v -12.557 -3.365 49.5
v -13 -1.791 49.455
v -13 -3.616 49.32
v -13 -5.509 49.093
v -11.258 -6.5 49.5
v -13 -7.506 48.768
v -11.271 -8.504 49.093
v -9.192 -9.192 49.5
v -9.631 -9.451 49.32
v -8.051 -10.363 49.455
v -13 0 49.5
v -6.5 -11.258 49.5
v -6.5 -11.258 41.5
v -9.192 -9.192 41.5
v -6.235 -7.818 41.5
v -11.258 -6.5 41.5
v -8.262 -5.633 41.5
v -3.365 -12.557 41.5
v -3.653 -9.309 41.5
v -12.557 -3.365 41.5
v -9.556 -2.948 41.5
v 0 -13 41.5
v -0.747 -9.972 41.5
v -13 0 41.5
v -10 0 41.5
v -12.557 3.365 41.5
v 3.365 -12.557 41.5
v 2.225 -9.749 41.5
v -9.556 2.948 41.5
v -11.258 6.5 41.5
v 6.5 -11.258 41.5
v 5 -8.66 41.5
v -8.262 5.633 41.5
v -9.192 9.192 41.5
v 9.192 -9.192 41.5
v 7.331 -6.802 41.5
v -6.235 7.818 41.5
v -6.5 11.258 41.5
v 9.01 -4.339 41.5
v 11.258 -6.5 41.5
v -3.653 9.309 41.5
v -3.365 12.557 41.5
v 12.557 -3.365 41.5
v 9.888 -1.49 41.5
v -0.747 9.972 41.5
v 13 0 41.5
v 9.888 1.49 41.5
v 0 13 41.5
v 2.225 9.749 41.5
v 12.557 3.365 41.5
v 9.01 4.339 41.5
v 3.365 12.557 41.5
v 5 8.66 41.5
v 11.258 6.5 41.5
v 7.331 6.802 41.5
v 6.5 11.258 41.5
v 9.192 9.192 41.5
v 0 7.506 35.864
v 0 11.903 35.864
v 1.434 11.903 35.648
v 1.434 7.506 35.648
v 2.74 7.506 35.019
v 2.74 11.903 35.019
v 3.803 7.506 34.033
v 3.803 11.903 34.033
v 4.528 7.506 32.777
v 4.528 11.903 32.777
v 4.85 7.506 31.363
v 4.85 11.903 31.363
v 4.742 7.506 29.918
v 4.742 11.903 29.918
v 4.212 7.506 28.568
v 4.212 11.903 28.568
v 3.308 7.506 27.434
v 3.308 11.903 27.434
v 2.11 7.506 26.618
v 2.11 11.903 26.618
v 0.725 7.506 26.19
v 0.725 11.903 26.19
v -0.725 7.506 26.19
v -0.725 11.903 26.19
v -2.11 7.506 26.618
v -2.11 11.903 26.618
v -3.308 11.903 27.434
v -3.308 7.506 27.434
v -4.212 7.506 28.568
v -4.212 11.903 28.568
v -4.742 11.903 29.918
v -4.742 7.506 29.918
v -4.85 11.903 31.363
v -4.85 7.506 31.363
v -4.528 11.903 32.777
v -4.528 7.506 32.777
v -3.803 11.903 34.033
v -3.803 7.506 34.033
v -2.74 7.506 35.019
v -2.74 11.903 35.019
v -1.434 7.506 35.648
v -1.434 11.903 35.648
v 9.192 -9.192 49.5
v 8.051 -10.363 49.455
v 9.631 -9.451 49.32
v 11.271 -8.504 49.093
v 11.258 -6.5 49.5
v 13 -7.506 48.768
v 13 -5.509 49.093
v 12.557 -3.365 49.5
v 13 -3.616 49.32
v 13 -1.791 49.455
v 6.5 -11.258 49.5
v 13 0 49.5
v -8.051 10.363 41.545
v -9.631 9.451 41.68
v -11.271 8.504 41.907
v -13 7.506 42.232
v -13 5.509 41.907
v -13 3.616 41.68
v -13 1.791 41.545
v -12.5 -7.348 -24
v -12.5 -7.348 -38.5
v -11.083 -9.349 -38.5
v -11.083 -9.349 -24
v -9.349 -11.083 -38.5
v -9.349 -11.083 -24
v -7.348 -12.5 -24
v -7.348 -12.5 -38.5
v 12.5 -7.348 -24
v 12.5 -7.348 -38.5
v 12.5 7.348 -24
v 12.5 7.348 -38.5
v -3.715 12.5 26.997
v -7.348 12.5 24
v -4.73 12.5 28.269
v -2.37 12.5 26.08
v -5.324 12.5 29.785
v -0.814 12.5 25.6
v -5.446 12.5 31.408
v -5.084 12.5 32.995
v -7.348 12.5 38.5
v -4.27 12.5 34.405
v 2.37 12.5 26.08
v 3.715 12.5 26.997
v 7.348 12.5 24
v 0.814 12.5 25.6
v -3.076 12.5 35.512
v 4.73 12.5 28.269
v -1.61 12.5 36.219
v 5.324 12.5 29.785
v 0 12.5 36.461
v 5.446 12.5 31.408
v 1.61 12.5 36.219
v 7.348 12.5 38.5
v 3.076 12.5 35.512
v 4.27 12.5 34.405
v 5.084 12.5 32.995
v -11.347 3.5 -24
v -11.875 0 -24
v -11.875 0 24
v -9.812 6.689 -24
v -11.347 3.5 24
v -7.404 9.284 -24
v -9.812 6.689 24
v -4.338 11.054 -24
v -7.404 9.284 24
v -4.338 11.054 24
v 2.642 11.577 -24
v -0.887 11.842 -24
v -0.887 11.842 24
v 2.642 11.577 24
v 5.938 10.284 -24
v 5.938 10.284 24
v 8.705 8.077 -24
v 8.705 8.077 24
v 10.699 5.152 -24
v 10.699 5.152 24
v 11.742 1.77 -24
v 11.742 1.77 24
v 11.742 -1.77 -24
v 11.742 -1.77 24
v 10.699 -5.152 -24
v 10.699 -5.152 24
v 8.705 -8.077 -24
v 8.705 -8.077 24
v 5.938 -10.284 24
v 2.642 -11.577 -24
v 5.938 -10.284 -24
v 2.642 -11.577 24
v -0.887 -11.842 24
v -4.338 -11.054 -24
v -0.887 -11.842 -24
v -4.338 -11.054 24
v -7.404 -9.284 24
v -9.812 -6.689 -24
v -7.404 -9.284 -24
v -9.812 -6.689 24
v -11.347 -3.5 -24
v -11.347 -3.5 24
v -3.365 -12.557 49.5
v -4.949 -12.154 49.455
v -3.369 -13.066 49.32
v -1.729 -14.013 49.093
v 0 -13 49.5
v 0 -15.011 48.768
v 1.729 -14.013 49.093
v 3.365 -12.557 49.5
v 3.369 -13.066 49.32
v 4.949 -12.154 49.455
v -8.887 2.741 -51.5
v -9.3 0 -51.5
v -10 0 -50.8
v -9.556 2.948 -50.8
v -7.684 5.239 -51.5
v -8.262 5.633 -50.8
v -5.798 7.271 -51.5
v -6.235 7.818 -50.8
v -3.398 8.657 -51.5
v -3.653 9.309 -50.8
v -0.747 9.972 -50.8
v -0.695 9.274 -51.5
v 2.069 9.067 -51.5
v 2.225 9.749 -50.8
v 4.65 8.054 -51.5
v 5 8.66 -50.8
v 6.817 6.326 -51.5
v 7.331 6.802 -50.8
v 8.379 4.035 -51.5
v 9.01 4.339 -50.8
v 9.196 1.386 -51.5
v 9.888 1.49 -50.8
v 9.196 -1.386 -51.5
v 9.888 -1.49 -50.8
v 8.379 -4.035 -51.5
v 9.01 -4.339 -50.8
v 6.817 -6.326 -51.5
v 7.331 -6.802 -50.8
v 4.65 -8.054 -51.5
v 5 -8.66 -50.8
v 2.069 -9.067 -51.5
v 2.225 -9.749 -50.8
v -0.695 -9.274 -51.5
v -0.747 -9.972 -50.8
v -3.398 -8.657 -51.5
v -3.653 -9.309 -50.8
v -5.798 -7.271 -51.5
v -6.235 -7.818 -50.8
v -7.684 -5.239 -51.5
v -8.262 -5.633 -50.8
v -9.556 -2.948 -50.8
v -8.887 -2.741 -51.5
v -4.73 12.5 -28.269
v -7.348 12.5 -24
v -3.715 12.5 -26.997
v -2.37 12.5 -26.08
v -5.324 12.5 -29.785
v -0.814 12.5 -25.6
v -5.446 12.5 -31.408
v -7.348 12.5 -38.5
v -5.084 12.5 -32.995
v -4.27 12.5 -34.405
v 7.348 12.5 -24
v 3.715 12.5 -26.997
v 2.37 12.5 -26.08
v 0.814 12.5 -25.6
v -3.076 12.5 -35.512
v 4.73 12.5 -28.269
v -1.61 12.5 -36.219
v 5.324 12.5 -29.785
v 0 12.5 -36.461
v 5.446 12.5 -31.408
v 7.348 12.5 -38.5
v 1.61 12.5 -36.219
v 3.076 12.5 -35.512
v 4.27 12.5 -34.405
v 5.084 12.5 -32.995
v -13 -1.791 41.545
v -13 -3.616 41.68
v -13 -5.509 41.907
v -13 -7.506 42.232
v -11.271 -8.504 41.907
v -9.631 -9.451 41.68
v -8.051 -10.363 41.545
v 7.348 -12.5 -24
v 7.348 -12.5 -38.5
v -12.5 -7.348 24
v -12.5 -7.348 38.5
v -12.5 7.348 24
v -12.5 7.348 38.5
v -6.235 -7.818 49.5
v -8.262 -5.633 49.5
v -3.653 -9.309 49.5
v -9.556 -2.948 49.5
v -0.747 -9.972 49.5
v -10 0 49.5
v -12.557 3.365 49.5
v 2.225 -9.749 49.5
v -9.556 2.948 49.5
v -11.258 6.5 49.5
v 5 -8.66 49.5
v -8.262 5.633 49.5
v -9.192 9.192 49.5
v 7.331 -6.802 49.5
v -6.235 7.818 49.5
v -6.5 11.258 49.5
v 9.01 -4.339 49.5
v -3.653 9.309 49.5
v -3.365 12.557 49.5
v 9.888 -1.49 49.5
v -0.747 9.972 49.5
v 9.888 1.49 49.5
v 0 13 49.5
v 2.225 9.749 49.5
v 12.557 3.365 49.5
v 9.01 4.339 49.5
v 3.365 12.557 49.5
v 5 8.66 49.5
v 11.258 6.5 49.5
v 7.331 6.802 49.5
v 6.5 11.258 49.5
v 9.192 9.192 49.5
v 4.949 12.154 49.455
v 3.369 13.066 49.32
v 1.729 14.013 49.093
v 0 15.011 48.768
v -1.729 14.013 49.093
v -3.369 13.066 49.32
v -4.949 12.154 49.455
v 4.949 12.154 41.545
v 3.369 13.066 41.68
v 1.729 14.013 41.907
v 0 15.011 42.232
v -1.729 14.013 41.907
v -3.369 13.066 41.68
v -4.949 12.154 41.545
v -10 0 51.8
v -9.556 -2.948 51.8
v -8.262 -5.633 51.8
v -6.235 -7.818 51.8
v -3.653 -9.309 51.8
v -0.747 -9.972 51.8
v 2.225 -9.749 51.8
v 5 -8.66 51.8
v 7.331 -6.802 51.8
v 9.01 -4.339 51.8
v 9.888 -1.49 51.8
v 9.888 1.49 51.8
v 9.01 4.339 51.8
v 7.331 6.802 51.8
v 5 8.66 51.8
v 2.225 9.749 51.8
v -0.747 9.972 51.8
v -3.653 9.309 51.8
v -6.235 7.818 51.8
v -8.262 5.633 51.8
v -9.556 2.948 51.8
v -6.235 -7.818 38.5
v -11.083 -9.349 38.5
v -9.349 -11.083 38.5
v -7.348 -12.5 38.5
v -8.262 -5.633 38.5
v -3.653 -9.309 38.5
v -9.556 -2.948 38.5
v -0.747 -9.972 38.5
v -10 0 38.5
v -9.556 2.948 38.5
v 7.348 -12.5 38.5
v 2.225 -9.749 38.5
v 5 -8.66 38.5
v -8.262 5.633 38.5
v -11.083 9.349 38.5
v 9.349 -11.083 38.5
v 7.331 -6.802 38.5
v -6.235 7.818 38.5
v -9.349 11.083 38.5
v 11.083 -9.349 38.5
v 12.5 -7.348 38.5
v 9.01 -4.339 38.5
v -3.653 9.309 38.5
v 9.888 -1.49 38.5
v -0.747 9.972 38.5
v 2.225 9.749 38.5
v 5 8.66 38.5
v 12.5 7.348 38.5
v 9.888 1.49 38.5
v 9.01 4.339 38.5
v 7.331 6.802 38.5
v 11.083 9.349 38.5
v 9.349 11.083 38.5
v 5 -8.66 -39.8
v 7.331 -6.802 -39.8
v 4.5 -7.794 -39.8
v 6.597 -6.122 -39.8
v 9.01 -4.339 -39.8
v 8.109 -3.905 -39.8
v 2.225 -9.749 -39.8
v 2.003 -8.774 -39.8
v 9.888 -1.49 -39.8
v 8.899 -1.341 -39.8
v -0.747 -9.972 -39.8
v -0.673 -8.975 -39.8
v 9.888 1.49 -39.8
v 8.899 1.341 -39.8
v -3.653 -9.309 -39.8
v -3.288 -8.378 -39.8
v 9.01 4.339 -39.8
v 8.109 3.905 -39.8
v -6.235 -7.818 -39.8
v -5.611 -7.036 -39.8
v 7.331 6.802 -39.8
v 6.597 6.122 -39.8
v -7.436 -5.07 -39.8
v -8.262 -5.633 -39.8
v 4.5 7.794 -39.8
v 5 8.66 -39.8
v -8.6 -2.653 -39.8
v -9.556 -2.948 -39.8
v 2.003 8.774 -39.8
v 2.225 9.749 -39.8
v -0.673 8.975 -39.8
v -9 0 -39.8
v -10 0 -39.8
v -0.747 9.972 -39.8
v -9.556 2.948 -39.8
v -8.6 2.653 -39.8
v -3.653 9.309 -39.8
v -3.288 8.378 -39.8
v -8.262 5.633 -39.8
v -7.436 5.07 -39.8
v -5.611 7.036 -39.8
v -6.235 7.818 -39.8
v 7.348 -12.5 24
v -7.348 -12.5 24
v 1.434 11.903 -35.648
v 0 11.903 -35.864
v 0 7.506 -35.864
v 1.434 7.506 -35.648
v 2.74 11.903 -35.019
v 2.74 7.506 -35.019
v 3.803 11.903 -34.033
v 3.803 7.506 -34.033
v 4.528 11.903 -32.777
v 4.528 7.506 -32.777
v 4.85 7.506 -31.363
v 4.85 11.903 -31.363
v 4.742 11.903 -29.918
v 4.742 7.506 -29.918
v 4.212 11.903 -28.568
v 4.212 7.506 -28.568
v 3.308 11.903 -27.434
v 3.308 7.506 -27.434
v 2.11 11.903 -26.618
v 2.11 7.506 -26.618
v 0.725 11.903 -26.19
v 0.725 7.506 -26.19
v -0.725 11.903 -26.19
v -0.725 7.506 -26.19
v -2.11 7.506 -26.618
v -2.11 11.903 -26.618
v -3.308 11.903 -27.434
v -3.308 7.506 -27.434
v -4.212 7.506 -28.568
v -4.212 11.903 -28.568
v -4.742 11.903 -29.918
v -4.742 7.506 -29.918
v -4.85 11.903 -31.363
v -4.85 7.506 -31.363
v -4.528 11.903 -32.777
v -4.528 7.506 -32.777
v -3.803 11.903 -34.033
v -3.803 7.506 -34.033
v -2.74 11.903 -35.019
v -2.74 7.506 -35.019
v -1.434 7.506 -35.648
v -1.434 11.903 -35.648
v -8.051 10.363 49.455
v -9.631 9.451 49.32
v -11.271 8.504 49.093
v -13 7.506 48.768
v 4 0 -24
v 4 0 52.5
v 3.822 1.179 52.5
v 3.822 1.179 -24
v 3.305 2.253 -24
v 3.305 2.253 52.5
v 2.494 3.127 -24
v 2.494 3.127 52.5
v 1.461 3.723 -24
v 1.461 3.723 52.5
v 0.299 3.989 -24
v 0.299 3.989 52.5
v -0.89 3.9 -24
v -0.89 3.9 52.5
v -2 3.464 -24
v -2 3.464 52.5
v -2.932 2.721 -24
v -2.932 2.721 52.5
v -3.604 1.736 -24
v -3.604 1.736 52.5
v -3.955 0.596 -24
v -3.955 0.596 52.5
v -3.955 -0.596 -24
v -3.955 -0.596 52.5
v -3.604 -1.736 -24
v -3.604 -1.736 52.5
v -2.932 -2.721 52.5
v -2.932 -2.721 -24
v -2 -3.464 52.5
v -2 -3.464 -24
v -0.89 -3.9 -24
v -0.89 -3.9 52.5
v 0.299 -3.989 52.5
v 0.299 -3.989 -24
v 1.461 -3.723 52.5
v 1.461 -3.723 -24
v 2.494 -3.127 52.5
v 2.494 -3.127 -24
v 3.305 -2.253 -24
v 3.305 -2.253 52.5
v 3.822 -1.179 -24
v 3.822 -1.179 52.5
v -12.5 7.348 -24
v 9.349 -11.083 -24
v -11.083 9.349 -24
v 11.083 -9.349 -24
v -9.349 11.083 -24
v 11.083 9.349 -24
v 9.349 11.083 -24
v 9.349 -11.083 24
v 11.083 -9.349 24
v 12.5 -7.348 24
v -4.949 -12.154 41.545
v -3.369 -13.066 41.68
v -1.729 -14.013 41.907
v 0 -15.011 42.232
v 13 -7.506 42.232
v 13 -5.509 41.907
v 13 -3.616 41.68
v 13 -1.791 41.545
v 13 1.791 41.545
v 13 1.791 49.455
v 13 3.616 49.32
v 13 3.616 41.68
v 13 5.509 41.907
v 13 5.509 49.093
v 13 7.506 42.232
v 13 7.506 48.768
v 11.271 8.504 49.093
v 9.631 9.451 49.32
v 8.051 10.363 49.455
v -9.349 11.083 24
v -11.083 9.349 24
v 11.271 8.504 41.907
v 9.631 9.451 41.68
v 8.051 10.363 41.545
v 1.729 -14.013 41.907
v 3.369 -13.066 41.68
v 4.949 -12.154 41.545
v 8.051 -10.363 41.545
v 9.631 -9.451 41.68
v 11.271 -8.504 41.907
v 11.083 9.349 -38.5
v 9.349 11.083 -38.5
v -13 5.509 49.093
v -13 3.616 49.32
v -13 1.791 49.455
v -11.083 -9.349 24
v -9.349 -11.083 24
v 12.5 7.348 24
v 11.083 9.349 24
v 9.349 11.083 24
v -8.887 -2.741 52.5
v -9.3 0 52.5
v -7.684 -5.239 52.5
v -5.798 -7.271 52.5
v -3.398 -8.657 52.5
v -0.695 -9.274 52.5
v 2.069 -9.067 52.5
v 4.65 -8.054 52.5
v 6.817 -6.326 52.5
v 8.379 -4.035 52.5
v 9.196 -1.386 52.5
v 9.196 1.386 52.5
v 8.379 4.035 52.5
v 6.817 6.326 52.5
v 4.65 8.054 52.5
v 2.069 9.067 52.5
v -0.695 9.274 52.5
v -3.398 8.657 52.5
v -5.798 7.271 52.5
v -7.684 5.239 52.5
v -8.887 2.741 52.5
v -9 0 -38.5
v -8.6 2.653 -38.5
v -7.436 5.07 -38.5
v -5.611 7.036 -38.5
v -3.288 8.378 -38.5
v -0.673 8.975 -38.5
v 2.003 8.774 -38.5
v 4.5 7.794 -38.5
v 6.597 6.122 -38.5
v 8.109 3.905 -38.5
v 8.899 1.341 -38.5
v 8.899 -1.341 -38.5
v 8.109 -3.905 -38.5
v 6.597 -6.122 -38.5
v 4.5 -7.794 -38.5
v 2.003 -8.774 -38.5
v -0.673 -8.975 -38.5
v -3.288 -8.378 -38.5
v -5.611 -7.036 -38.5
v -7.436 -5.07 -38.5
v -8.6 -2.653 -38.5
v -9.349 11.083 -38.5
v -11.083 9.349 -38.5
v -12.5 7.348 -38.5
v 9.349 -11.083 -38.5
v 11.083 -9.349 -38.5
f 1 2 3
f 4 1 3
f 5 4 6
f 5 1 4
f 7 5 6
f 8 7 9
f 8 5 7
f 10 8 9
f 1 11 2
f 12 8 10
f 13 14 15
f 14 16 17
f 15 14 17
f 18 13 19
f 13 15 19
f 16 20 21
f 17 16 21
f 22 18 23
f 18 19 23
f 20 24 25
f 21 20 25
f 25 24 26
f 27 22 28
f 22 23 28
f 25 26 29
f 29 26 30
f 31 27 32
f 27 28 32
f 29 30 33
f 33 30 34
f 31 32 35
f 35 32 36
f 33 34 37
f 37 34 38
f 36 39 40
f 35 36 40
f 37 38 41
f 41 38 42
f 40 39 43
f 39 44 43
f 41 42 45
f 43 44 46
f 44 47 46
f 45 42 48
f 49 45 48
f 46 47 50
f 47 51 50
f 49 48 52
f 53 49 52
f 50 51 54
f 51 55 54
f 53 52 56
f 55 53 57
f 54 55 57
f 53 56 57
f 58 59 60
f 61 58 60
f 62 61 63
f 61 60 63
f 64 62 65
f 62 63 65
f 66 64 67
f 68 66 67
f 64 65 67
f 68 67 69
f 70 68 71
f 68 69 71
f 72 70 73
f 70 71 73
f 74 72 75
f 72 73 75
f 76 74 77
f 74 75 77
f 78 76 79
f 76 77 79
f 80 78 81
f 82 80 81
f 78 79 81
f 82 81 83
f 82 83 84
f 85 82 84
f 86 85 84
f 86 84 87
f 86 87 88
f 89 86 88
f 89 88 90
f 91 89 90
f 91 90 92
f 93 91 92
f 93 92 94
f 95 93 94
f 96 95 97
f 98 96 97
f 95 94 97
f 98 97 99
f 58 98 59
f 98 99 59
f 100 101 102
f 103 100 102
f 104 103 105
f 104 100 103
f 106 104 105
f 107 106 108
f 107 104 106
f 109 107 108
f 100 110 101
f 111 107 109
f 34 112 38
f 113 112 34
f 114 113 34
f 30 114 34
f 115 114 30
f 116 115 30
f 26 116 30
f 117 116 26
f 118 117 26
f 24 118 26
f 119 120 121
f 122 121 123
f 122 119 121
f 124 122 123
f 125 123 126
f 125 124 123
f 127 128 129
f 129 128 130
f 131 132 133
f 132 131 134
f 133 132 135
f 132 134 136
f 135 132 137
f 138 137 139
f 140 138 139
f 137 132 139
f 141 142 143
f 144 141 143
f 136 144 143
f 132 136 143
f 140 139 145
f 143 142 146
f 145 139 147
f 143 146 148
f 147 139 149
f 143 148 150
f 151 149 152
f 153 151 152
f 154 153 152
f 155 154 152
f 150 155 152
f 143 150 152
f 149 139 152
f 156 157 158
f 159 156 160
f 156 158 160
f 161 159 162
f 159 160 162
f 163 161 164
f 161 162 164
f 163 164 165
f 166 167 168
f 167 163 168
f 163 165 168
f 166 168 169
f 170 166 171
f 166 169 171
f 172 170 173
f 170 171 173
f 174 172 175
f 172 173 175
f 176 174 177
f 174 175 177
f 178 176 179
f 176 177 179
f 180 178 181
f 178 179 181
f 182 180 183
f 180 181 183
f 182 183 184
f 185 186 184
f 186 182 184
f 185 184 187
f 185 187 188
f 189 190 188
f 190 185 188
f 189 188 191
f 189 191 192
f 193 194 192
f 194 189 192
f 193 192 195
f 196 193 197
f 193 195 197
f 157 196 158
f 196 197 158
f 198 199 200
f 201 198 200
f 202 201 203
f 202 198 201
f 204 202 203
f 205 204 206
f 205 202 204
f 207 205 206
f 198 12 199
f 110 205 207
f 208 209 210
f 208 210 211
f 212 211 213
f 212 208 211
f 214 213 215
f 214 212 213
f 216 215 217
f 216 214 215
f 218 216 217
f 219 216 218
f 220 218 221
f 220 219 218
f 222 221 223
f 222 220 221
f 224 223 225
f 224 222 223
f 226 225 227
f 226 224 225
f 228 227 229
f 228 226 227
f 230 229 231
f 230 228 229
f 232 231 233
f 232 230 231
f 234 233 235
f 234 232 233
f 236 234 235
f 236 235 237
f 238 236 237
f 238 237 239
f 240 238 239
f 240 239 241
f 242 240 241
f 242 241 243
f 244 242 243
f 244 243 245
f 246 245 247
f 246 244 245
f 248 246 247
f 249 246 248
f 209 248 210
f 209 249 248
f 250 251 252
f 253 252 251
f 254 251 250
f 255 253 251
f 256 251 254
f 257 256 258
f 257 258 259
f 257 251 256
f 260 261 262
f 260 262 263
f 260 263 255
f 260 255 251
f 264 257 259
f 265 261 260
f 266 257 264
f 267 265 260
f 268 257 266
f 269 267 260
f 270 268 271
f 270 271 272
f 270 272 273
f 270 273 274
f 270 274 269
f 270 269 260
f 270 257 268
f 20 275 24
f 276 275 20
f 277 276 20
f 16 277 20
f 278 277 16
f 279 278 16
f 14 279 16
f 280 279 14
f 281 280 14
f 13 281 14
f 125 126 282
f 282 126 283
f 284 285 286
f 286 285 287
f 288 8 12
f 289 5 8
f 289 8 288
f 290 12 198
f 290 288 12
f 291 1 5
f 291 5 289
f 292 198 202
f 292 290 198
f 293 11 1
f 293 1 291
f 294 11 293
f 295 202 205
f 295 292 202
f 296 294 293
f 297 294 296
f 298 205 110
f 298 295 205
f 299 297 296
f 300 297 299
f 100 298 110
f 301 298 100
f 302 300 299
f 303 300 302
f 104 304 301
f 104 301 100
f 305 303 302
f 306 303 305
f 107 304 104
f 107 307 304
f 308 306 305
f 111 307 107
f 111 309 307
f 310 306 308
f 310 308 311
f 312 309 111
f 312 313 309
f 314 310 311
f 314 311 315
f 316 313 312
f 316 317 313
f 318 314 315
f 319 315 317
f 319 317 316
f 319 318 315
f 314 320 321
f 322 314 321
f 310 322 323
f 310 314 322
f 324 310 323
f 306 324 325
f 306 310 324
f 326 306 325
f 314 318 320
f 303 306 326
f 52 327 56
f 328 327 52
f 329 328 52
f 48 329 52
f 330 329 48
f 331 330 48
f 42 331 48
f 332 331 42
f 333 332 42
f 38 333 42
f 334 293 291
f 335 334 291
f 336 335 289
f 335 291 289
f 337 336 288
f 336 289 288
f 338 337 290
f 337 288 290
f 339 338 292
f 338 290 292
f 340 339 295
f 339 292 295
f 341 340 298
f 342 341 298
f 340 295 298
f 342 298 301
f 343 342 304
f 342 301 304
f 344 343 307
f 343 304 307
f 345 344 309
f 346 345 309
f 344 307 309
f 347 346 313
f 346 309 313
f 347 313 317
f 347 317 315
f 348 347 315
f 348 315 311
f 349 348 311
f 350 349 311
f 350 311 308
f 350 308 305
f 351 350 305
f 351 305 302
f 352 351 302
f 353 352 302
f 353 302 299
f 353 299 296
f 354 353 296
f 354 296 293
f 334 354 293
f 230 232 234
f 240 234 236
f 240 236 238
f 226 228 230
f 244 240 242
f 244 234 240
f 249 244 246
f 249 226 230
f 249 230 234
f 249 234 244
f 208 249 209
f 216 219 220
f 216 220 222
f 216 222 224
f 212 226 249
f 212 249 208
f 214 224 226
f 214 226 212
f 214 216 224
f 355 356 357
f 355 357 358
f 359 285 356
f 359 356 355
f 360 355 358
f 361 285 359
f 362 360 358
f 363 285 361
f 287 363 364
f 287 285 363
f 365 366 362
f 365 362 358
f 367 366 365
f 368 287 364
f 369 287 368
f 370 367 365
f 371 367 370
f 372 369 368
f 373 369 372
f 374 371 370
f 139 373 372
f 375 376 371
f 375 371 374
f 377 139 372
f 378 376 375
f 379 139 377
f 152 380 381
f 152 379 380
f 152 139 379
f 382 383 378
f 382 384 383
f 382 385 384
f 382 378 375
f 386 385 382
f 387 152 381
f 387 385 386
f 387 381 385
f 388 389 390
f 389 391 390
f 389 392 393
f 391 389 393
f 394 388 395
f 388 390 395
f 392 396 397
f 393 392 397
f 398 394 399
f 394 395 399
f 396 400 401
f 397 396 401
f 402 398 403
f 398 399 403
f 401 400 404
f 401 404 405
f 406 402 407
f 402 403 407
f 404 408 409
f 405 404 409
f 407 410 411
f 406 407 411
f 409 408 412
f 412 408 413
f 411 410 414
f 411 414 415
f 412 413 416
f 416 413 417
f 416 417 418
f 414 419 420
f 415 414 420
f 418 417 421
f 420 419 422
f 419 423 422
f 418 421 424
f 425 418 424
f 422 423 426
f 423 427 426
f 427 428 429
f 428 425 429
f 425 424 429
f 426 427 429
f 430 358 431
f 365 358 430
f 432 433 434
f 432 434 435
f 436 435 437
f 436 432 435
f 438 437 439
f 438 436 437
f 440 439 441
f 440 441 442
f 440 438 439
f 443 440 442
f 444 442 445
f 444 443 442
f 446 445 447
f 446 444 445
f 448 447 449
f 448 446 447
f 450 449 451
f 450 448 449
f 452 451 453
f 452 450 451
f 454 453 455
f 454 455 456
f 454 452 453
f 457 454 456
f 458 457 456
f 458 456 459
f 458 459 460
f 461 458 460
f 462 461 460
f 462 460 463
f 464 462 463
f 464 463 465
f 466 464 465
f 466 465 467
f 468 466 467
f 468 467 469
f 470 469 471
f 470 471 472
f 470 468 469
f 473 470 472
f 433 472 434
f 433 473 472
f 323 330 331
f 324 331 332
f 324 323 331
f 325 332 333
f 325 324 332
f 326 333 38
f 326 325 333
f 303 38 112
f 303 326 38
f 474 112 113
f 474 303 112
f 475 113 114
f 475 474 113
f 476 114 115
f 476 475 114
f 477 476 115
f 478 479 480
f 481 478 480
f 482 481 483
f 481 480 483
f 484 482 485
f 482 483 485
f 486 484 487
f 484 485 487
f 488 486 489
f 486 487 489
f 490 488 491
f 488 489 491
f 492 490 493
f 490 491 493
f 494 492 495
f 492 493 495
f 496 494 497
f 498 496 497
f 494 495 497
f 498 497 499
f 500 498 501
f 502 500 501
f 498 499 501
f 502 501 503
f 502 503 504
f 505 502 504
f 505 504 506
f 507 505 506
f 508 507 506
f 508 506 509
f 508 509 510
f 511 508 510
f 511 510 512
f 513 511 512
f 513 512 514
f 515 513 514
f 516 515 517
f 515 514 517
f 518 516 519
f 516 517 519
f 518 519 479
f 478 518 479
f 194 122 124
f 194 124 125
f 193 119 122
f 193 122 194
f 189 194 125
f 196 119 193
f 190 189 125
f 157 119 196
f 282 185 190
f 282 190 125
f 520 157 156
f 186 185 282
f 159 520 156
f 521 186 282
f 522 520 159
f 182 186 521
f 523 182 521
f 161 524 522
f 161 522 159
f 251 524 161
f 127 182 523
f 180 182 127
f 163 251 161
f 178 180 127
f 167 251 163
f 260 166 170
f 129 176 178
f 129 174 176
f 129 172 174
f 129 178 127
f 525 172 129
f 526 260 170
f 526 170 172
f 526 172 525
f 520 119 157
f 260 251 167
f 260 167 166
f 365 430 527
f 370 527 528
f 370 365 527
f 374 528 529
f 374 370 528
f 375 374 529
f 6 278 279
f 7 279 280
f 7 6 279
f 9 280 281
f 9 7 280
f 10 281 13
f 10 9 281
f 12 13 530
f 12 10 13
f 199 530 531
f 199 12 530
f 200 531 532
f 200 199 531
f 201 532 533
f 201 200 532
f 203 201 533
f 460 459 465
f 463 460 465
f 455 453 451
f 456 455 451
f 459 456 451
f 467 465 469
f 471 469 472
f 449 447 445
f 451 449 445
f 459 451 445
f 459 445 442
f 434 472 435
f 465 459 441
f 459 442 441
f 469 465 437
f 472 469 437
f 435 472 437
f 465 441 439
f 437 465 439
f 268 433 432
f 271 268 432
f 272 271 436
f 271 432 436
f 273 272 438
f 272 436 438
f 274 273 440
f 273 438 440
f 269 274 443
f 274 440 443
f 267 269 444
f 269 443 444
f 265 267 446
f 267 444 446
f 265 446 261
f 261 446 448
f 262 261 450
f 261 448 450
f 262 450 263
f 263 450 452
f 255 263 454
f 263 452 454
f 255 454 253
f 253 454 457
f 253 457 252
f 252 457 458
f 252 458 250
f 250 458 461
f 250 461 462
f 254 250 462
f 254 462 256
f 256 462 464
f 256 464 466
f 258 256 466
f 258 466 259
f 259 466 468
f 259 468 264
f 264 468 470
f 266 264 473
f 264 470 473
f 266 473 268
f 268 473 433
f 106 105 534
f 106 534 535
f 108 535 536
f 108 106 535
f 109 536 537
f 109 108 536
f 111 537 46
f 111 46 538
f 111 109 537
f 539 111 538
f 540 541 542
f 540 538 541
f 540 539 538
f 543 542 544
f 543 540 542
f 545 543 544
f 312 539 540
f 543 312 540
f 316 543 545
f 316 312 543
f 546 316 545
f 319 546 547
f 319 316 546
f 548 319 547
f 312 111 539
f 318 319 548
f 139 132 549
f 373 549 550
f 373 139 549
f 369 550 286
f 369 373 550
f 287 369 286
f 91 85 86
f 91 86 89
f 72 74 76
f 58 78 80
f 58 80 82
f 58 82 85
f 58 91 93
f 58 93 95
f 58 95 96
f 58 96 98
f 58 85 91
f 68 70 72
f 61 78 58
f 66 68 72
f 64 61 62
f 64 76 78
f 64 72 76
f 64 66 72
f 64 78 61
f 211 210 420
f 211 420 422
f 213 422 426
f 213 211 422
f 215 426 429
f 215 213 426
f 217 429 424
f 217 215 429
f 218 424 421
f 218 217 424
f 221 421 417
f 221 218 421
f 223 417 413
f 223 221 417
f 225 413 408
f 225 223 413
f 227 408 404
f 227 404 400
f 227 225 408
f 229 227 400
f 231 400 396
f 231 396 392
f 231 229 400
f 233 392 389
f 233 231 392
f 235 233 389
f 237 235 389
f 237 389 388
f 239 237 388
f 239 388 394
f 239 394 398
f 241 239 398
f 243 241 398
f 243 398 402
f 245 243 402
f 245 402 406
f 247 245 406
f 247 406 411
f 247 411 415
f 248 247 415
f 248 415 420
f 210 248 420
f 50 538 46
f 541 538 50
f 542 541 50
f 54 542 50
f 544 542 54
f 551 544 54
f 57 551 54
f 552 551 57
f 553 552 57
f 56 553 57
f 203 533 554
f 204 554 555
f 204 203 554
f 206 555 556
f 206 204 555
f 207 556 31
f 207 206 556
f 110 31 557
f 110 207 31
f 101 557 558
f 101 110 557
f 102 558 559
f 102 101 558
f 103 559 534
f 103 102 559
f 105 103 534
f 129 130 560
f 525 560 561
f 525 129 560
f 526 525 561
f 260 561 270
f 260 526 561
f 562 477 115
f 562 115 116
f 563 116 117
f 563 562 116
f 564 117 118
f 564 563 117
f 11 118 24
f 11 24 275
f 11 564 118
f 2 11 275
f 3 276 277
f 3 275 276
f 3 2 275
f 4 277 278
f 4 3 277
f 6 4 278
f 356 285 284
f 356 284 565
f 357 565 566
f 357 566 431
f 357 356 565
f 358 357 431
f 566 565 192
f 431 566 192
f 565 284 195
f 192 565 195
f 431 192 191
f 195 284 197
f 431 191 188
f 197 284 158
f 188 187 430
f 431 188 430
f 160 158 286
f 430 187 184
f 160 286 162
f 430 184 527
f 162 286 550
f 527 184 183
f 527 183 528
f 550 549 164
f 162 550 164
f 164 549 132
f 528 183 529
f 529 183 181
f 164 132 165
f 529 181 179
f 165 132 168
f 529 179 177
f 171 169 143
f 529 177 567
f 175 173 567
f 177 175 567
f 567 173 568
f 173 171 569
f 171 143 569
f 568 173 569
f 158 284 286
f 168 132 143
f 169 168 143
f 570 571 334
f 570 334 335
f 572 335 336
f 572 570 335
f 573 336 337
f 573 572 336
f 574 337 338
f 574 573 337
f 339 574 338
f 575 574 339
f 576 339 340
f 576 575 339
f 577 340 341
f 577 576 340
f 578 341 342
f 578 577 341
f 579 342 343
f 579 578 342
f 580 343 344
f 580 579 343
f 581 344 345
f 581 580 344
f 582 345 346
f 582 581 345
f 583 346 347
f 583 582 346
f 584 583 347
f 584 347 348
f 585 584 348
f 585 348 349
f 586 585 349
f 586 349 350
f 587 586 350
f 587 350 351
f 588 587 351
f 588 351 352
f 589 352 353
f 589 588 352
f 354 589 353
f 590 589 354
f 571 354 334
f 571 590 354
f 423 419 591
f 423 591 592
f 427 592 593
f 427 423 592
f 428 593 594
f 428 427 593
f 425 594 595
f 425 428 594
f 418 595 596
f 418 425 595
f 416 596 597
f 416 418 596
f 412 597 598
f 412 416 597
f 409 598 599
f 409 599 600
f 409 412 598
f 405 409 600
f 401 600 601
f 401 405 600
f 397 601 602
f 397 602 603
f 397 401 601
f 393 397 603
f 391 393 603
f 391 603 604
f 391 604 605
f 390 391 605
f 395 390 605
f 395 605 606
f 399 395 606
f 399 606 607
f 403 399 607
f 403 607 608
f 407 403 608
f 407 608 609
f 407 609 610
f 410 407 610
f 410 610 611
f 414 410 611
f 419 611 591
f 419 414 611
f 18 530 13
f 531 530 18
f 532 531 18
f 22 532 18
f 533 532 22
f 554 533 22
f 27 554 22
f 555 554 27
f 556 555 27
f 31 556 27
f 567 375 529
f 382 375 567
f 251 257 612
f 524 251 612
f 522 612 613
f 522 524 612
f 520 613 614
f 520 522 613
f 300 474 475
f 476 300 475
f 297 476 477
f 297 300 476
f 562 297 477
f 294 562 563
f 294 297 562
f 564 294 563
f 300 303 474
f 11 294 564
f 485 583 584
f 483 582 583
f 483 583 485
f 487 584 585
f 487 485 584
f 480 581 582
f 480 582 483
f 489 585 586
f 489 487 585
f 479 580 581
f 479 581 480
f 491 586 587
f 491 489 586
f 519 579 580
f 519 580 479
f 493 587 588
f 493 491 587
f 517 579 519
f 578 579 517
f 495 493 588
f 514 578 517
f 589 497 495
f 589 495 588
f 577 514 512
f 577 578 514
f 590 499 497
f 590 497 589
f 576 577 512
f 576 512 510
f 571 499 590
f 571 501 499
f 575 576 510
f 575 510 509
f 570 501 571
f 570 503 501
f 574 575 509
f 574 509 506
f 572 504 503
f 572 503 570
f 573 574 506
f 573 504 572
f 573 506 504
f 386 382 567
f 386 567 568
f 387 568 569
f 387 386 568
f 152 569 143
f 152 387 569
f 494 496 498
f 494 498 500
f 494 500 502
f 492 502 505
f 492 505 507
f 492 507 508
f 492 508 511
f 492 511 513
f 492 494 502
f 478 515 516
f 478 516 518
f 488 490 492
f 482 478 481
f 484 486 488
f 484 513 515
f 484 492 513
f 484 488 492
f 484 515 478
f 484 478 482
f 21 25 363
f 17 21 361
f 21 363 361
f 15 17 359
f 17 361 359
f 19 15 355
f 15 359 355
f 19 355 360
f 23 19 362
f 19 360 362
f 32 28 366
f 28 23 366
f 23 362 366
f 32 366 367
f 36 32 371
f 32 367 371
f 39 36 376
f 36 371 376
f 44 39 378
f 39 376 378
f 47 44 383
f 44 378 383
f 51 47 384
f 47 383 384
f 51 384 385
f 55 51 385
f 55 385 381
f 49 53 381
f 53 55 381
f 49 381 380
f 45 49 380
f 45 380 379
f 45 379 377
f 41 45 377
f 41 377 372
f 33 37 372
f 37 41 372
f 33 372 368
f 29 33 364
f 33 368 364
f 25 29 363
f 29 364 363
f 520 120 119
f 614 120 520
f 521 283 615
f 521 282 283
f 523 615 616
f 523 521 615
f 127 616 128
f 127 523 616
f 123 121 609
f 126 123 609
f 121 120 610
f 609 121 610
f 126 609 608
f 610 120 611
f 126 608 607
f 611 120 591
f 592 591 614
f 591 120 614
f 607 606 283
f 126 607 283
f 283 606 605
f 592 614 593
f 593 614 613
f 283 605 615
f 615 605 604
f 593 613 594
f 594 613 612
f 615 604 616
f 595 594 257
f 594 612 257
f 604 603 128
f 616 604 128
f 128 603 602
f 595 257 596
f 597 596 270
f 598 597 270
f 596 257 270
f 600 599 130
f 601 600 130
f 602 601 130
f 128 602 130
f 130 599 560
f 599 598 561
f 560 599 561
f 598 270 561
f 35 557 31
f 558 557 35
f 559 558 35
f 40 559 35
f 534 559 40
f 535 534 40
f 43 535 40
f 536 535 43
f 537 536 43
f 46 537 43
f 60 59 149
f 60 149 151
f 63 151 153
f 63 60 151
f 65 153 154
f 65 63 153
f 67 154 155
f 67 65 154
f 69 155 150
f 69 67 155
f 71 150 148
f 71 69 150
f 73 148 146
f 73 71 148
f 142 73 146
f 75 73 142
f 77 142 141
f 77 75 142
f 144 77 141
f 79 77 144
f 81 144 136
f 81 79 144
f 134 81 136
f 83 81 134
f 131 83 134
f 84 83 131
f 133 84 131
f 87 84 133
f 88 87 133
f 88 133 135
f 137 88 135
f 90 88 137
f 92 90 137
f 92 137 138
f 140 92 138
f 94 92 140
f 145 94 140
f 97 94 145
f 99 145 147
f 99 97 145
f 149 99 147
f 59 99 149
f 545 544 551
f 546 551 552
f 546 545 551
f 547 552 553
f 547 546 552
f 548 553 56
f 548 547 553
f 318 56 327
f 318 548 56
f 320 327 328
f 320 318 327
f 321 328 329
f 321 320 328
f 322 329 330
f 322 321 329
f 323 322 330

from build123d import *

# Parameters (mm, degrees)
EXTRUDE_START       = 38.5
SKETCH_4_W          = 25
SKETCH_4_H          = 25
EXTRUDE_1_DEPTH     = 14.5
SKETCH_5_R          = 11.875
EXTRUDE_2_DEPTH     = 62.5
SKETCH_6_R          = 10
EXTRUDE_3_DEPTH     = 14
EXTRUDE_START_2     = 49.5
EXTRUDE_4_DEPTH     = 8
SKETCH_8_R          = 4.864
CUT_EXTRUDE_1_DEPTH = 4.994447
SKETCH_9_OUTSIDE_W  = 47.858
SKETCH_9_OUTSIDE_H  = 51.88
SKETCH_9_OUTSIDE_R  = 14.5
CUT_EXTRUDE_2_DEPTH = 77
SKETCH_11_R         = 4
CUT_EXTRUDE_3_DEPTH = 76.5
CHAMFER_1_SIZE      = 0.7
CHAMFER_2_SIZE      = 0.59728
EXTRUDE_START_3     = 13
SKETCH_12_R         = 10
EXTRUDE_5_DEPTH     = 13
CUT_EXTRUDE_START   = 1.3
SKETCH_13_R         = 10
SKETCH_13_R_2       = 9
CUT_EXTRUDE_4_DEPTH = 1.3
CHAMFER_3_SIZE      = 0.7


with BuildPart() as part:
    # 草图4 → 凸台-拉伸1 (new body)
    with BuildSketch(Plane.XY.offset(EXTRUDE_START)):
        Rectangle(SKETCH_4_W, SKETCH_4_H)
    extrude_1 = extrude(amount=-EXTRUDE_1_DEPTH)

    # 草图5 → 凸台-拉伸2 (add)
    with BuildSketch(Plane(origin=(0, 0, 24), x_dir=(-1, 0, 0), z_dir=(0, 0, -1))):
        Circle(SKETCH_5_R)
    extrude(amount=EXTRUDE_2_DEPTH)

    # 镜向1: 凸台-拉伸1 across plane
    add(extrude_1.mirror(Plane.XY))

    # 草图6 → 凸台-拉伸3 (add)
    with BuildSketch(Plane.XY.offset(38.5)):
        with Locations(Location((0, 0, 0), (0, 0, 180))):
            Circle(SKETCH_6_R)
    extrude(amount=EXTRUDE_3_DEPTH)

    # 草图7 → 凸台-拉伸4 (add)
    with BuildSketch(Plane.XY.offset(EXTRUDE_START_2)):
        Polygon((13, 7.505553499), (0, 15.011106999), (-13, 7.505553499), (-13, -7.505553499), (0, -15.011106999), (13, -7.505553499), align=None)
    extrude(amount=-EXTRUDE_4_DEPTH)

    # 草图10 → 切除-旋转1 (revolve, cut)
    with BuildSketch(Plane(origin=(0, 0, 0), x_dir=(1, 0, 0), z_dir=(0, 1, 0)), mode=Mode.PRIVATE) as cut_revolve_1_sk:
        Polygon((-13, -49.5), (-25.989909678, -49.5), (-25.989909678, -41.5), (-13, -41.5), (-23.989909678, -45.5), align=None)
    revolve(cut_revolve_1_sk.sketch.rotate(Axis((0, 0, 52.5), (0, 0, 1)), 180), axis=Axis((0, 0, 52.5), (0, 0, 1)), mode=Mode.SUBTRACT)

    # 草图8 → 切除-拉伸1 (cut)
    with BuildSketch(Plane(origin=(0, 12.5, 0), x_dir=(1, 0, 0), z_dir=(0, 1, 0))):
        with Locations(Location((0, -31, 0), (0, 0, 270))):
            Circle(SKETCH_8_R)
    cut_extrude_1 = extrude(amount=-CUT_EXTRUDE_1_DEPTH, mode=Mode.SUBTRACT)

    # 镜向2: 切除-拉伸1 across plane
    add(cut_extrude_1.mirror(Plane.XY), mode=Mode.SUBTRACT)

    # 草图9 outside → 切除-拉伸2 (cut)
    with BuildSketch(Plane.XY.offset(38.5)):
        Rectangle(SKETCH_9_OUTSIDE_W, SKETCH_9_OUTSIDE_H)
        Circle(SKETCH_9_OUTSIDE_R, mode=Mode.SUBTRACT)
    extrude(amount=-CUT_EXTRUDE_2_DEPTH, mode=Mode.SUBTRACT)

    # 草图11 → 切除-拉伸3 (cut)
    with BuildSketch(Plane.XY.offset(52.5)):
        Circle(SKETCH_11_R)
    extrude(amount=-CUT_EXTRUDE_3_DEPTH, mode=Mode.SUBTRACT)

    # 倒角1
    chamfer_1_edges = [part.edges().sort_by_distance(p)[0] for p in [
        (10, 0, 52.5),
    ]]
    chamfer(chamfer_1_edges, length=CHAMFER_1_SIZE)

    # 倒角2
    chamfer_2_edges = [part.edges().sort_by_distance(p)[0] for p in [
        (0, 12.5, 26.136),
        (0, 12.5, -26.136),
    ]]
    chamfer(chamfer_2_edges, length=CHAMFER_2_SIZE)

    # 草图12 → 凸台-拉伸5 (add)
    with BuildSketch(Plane(origin=(0, 0, -38.5), x_dir=(-1, 0, 0), z_dir=(0, 0, -1)).offset(EXTRUDE_START_3)):
        Circle(SKETCH_12_R)
    extrude(amount=-EXTRUDE_5_DEPTH)

    # 草图13 → 切除-拉伸4 (cut)
    with BuildSketch(Plane(origin=(0, 0, -38.5), x_dir=(-1, 0, 0), z_dir=(0, 0, -1)).offset(CUT_EXTRUDE_START)):
        Circle(SKETCH_13_R)
        Circle(SKETCH_13_R_2, mode=Mode.SUBTRACT)
    extrude(amount=-CUT_EXTRUDE_4_DEPTH, mode=Mode.SUBTRACT)

    # 倒角3
    chamfer_3_edges = [part.edges().sort_by_distance(p)[0] for p in [
        (10, 0, -51.5),
    ]]
    chamfer(chamfer_3_edges, length=CHAMFER_3_SIZE)


solid = part.part
